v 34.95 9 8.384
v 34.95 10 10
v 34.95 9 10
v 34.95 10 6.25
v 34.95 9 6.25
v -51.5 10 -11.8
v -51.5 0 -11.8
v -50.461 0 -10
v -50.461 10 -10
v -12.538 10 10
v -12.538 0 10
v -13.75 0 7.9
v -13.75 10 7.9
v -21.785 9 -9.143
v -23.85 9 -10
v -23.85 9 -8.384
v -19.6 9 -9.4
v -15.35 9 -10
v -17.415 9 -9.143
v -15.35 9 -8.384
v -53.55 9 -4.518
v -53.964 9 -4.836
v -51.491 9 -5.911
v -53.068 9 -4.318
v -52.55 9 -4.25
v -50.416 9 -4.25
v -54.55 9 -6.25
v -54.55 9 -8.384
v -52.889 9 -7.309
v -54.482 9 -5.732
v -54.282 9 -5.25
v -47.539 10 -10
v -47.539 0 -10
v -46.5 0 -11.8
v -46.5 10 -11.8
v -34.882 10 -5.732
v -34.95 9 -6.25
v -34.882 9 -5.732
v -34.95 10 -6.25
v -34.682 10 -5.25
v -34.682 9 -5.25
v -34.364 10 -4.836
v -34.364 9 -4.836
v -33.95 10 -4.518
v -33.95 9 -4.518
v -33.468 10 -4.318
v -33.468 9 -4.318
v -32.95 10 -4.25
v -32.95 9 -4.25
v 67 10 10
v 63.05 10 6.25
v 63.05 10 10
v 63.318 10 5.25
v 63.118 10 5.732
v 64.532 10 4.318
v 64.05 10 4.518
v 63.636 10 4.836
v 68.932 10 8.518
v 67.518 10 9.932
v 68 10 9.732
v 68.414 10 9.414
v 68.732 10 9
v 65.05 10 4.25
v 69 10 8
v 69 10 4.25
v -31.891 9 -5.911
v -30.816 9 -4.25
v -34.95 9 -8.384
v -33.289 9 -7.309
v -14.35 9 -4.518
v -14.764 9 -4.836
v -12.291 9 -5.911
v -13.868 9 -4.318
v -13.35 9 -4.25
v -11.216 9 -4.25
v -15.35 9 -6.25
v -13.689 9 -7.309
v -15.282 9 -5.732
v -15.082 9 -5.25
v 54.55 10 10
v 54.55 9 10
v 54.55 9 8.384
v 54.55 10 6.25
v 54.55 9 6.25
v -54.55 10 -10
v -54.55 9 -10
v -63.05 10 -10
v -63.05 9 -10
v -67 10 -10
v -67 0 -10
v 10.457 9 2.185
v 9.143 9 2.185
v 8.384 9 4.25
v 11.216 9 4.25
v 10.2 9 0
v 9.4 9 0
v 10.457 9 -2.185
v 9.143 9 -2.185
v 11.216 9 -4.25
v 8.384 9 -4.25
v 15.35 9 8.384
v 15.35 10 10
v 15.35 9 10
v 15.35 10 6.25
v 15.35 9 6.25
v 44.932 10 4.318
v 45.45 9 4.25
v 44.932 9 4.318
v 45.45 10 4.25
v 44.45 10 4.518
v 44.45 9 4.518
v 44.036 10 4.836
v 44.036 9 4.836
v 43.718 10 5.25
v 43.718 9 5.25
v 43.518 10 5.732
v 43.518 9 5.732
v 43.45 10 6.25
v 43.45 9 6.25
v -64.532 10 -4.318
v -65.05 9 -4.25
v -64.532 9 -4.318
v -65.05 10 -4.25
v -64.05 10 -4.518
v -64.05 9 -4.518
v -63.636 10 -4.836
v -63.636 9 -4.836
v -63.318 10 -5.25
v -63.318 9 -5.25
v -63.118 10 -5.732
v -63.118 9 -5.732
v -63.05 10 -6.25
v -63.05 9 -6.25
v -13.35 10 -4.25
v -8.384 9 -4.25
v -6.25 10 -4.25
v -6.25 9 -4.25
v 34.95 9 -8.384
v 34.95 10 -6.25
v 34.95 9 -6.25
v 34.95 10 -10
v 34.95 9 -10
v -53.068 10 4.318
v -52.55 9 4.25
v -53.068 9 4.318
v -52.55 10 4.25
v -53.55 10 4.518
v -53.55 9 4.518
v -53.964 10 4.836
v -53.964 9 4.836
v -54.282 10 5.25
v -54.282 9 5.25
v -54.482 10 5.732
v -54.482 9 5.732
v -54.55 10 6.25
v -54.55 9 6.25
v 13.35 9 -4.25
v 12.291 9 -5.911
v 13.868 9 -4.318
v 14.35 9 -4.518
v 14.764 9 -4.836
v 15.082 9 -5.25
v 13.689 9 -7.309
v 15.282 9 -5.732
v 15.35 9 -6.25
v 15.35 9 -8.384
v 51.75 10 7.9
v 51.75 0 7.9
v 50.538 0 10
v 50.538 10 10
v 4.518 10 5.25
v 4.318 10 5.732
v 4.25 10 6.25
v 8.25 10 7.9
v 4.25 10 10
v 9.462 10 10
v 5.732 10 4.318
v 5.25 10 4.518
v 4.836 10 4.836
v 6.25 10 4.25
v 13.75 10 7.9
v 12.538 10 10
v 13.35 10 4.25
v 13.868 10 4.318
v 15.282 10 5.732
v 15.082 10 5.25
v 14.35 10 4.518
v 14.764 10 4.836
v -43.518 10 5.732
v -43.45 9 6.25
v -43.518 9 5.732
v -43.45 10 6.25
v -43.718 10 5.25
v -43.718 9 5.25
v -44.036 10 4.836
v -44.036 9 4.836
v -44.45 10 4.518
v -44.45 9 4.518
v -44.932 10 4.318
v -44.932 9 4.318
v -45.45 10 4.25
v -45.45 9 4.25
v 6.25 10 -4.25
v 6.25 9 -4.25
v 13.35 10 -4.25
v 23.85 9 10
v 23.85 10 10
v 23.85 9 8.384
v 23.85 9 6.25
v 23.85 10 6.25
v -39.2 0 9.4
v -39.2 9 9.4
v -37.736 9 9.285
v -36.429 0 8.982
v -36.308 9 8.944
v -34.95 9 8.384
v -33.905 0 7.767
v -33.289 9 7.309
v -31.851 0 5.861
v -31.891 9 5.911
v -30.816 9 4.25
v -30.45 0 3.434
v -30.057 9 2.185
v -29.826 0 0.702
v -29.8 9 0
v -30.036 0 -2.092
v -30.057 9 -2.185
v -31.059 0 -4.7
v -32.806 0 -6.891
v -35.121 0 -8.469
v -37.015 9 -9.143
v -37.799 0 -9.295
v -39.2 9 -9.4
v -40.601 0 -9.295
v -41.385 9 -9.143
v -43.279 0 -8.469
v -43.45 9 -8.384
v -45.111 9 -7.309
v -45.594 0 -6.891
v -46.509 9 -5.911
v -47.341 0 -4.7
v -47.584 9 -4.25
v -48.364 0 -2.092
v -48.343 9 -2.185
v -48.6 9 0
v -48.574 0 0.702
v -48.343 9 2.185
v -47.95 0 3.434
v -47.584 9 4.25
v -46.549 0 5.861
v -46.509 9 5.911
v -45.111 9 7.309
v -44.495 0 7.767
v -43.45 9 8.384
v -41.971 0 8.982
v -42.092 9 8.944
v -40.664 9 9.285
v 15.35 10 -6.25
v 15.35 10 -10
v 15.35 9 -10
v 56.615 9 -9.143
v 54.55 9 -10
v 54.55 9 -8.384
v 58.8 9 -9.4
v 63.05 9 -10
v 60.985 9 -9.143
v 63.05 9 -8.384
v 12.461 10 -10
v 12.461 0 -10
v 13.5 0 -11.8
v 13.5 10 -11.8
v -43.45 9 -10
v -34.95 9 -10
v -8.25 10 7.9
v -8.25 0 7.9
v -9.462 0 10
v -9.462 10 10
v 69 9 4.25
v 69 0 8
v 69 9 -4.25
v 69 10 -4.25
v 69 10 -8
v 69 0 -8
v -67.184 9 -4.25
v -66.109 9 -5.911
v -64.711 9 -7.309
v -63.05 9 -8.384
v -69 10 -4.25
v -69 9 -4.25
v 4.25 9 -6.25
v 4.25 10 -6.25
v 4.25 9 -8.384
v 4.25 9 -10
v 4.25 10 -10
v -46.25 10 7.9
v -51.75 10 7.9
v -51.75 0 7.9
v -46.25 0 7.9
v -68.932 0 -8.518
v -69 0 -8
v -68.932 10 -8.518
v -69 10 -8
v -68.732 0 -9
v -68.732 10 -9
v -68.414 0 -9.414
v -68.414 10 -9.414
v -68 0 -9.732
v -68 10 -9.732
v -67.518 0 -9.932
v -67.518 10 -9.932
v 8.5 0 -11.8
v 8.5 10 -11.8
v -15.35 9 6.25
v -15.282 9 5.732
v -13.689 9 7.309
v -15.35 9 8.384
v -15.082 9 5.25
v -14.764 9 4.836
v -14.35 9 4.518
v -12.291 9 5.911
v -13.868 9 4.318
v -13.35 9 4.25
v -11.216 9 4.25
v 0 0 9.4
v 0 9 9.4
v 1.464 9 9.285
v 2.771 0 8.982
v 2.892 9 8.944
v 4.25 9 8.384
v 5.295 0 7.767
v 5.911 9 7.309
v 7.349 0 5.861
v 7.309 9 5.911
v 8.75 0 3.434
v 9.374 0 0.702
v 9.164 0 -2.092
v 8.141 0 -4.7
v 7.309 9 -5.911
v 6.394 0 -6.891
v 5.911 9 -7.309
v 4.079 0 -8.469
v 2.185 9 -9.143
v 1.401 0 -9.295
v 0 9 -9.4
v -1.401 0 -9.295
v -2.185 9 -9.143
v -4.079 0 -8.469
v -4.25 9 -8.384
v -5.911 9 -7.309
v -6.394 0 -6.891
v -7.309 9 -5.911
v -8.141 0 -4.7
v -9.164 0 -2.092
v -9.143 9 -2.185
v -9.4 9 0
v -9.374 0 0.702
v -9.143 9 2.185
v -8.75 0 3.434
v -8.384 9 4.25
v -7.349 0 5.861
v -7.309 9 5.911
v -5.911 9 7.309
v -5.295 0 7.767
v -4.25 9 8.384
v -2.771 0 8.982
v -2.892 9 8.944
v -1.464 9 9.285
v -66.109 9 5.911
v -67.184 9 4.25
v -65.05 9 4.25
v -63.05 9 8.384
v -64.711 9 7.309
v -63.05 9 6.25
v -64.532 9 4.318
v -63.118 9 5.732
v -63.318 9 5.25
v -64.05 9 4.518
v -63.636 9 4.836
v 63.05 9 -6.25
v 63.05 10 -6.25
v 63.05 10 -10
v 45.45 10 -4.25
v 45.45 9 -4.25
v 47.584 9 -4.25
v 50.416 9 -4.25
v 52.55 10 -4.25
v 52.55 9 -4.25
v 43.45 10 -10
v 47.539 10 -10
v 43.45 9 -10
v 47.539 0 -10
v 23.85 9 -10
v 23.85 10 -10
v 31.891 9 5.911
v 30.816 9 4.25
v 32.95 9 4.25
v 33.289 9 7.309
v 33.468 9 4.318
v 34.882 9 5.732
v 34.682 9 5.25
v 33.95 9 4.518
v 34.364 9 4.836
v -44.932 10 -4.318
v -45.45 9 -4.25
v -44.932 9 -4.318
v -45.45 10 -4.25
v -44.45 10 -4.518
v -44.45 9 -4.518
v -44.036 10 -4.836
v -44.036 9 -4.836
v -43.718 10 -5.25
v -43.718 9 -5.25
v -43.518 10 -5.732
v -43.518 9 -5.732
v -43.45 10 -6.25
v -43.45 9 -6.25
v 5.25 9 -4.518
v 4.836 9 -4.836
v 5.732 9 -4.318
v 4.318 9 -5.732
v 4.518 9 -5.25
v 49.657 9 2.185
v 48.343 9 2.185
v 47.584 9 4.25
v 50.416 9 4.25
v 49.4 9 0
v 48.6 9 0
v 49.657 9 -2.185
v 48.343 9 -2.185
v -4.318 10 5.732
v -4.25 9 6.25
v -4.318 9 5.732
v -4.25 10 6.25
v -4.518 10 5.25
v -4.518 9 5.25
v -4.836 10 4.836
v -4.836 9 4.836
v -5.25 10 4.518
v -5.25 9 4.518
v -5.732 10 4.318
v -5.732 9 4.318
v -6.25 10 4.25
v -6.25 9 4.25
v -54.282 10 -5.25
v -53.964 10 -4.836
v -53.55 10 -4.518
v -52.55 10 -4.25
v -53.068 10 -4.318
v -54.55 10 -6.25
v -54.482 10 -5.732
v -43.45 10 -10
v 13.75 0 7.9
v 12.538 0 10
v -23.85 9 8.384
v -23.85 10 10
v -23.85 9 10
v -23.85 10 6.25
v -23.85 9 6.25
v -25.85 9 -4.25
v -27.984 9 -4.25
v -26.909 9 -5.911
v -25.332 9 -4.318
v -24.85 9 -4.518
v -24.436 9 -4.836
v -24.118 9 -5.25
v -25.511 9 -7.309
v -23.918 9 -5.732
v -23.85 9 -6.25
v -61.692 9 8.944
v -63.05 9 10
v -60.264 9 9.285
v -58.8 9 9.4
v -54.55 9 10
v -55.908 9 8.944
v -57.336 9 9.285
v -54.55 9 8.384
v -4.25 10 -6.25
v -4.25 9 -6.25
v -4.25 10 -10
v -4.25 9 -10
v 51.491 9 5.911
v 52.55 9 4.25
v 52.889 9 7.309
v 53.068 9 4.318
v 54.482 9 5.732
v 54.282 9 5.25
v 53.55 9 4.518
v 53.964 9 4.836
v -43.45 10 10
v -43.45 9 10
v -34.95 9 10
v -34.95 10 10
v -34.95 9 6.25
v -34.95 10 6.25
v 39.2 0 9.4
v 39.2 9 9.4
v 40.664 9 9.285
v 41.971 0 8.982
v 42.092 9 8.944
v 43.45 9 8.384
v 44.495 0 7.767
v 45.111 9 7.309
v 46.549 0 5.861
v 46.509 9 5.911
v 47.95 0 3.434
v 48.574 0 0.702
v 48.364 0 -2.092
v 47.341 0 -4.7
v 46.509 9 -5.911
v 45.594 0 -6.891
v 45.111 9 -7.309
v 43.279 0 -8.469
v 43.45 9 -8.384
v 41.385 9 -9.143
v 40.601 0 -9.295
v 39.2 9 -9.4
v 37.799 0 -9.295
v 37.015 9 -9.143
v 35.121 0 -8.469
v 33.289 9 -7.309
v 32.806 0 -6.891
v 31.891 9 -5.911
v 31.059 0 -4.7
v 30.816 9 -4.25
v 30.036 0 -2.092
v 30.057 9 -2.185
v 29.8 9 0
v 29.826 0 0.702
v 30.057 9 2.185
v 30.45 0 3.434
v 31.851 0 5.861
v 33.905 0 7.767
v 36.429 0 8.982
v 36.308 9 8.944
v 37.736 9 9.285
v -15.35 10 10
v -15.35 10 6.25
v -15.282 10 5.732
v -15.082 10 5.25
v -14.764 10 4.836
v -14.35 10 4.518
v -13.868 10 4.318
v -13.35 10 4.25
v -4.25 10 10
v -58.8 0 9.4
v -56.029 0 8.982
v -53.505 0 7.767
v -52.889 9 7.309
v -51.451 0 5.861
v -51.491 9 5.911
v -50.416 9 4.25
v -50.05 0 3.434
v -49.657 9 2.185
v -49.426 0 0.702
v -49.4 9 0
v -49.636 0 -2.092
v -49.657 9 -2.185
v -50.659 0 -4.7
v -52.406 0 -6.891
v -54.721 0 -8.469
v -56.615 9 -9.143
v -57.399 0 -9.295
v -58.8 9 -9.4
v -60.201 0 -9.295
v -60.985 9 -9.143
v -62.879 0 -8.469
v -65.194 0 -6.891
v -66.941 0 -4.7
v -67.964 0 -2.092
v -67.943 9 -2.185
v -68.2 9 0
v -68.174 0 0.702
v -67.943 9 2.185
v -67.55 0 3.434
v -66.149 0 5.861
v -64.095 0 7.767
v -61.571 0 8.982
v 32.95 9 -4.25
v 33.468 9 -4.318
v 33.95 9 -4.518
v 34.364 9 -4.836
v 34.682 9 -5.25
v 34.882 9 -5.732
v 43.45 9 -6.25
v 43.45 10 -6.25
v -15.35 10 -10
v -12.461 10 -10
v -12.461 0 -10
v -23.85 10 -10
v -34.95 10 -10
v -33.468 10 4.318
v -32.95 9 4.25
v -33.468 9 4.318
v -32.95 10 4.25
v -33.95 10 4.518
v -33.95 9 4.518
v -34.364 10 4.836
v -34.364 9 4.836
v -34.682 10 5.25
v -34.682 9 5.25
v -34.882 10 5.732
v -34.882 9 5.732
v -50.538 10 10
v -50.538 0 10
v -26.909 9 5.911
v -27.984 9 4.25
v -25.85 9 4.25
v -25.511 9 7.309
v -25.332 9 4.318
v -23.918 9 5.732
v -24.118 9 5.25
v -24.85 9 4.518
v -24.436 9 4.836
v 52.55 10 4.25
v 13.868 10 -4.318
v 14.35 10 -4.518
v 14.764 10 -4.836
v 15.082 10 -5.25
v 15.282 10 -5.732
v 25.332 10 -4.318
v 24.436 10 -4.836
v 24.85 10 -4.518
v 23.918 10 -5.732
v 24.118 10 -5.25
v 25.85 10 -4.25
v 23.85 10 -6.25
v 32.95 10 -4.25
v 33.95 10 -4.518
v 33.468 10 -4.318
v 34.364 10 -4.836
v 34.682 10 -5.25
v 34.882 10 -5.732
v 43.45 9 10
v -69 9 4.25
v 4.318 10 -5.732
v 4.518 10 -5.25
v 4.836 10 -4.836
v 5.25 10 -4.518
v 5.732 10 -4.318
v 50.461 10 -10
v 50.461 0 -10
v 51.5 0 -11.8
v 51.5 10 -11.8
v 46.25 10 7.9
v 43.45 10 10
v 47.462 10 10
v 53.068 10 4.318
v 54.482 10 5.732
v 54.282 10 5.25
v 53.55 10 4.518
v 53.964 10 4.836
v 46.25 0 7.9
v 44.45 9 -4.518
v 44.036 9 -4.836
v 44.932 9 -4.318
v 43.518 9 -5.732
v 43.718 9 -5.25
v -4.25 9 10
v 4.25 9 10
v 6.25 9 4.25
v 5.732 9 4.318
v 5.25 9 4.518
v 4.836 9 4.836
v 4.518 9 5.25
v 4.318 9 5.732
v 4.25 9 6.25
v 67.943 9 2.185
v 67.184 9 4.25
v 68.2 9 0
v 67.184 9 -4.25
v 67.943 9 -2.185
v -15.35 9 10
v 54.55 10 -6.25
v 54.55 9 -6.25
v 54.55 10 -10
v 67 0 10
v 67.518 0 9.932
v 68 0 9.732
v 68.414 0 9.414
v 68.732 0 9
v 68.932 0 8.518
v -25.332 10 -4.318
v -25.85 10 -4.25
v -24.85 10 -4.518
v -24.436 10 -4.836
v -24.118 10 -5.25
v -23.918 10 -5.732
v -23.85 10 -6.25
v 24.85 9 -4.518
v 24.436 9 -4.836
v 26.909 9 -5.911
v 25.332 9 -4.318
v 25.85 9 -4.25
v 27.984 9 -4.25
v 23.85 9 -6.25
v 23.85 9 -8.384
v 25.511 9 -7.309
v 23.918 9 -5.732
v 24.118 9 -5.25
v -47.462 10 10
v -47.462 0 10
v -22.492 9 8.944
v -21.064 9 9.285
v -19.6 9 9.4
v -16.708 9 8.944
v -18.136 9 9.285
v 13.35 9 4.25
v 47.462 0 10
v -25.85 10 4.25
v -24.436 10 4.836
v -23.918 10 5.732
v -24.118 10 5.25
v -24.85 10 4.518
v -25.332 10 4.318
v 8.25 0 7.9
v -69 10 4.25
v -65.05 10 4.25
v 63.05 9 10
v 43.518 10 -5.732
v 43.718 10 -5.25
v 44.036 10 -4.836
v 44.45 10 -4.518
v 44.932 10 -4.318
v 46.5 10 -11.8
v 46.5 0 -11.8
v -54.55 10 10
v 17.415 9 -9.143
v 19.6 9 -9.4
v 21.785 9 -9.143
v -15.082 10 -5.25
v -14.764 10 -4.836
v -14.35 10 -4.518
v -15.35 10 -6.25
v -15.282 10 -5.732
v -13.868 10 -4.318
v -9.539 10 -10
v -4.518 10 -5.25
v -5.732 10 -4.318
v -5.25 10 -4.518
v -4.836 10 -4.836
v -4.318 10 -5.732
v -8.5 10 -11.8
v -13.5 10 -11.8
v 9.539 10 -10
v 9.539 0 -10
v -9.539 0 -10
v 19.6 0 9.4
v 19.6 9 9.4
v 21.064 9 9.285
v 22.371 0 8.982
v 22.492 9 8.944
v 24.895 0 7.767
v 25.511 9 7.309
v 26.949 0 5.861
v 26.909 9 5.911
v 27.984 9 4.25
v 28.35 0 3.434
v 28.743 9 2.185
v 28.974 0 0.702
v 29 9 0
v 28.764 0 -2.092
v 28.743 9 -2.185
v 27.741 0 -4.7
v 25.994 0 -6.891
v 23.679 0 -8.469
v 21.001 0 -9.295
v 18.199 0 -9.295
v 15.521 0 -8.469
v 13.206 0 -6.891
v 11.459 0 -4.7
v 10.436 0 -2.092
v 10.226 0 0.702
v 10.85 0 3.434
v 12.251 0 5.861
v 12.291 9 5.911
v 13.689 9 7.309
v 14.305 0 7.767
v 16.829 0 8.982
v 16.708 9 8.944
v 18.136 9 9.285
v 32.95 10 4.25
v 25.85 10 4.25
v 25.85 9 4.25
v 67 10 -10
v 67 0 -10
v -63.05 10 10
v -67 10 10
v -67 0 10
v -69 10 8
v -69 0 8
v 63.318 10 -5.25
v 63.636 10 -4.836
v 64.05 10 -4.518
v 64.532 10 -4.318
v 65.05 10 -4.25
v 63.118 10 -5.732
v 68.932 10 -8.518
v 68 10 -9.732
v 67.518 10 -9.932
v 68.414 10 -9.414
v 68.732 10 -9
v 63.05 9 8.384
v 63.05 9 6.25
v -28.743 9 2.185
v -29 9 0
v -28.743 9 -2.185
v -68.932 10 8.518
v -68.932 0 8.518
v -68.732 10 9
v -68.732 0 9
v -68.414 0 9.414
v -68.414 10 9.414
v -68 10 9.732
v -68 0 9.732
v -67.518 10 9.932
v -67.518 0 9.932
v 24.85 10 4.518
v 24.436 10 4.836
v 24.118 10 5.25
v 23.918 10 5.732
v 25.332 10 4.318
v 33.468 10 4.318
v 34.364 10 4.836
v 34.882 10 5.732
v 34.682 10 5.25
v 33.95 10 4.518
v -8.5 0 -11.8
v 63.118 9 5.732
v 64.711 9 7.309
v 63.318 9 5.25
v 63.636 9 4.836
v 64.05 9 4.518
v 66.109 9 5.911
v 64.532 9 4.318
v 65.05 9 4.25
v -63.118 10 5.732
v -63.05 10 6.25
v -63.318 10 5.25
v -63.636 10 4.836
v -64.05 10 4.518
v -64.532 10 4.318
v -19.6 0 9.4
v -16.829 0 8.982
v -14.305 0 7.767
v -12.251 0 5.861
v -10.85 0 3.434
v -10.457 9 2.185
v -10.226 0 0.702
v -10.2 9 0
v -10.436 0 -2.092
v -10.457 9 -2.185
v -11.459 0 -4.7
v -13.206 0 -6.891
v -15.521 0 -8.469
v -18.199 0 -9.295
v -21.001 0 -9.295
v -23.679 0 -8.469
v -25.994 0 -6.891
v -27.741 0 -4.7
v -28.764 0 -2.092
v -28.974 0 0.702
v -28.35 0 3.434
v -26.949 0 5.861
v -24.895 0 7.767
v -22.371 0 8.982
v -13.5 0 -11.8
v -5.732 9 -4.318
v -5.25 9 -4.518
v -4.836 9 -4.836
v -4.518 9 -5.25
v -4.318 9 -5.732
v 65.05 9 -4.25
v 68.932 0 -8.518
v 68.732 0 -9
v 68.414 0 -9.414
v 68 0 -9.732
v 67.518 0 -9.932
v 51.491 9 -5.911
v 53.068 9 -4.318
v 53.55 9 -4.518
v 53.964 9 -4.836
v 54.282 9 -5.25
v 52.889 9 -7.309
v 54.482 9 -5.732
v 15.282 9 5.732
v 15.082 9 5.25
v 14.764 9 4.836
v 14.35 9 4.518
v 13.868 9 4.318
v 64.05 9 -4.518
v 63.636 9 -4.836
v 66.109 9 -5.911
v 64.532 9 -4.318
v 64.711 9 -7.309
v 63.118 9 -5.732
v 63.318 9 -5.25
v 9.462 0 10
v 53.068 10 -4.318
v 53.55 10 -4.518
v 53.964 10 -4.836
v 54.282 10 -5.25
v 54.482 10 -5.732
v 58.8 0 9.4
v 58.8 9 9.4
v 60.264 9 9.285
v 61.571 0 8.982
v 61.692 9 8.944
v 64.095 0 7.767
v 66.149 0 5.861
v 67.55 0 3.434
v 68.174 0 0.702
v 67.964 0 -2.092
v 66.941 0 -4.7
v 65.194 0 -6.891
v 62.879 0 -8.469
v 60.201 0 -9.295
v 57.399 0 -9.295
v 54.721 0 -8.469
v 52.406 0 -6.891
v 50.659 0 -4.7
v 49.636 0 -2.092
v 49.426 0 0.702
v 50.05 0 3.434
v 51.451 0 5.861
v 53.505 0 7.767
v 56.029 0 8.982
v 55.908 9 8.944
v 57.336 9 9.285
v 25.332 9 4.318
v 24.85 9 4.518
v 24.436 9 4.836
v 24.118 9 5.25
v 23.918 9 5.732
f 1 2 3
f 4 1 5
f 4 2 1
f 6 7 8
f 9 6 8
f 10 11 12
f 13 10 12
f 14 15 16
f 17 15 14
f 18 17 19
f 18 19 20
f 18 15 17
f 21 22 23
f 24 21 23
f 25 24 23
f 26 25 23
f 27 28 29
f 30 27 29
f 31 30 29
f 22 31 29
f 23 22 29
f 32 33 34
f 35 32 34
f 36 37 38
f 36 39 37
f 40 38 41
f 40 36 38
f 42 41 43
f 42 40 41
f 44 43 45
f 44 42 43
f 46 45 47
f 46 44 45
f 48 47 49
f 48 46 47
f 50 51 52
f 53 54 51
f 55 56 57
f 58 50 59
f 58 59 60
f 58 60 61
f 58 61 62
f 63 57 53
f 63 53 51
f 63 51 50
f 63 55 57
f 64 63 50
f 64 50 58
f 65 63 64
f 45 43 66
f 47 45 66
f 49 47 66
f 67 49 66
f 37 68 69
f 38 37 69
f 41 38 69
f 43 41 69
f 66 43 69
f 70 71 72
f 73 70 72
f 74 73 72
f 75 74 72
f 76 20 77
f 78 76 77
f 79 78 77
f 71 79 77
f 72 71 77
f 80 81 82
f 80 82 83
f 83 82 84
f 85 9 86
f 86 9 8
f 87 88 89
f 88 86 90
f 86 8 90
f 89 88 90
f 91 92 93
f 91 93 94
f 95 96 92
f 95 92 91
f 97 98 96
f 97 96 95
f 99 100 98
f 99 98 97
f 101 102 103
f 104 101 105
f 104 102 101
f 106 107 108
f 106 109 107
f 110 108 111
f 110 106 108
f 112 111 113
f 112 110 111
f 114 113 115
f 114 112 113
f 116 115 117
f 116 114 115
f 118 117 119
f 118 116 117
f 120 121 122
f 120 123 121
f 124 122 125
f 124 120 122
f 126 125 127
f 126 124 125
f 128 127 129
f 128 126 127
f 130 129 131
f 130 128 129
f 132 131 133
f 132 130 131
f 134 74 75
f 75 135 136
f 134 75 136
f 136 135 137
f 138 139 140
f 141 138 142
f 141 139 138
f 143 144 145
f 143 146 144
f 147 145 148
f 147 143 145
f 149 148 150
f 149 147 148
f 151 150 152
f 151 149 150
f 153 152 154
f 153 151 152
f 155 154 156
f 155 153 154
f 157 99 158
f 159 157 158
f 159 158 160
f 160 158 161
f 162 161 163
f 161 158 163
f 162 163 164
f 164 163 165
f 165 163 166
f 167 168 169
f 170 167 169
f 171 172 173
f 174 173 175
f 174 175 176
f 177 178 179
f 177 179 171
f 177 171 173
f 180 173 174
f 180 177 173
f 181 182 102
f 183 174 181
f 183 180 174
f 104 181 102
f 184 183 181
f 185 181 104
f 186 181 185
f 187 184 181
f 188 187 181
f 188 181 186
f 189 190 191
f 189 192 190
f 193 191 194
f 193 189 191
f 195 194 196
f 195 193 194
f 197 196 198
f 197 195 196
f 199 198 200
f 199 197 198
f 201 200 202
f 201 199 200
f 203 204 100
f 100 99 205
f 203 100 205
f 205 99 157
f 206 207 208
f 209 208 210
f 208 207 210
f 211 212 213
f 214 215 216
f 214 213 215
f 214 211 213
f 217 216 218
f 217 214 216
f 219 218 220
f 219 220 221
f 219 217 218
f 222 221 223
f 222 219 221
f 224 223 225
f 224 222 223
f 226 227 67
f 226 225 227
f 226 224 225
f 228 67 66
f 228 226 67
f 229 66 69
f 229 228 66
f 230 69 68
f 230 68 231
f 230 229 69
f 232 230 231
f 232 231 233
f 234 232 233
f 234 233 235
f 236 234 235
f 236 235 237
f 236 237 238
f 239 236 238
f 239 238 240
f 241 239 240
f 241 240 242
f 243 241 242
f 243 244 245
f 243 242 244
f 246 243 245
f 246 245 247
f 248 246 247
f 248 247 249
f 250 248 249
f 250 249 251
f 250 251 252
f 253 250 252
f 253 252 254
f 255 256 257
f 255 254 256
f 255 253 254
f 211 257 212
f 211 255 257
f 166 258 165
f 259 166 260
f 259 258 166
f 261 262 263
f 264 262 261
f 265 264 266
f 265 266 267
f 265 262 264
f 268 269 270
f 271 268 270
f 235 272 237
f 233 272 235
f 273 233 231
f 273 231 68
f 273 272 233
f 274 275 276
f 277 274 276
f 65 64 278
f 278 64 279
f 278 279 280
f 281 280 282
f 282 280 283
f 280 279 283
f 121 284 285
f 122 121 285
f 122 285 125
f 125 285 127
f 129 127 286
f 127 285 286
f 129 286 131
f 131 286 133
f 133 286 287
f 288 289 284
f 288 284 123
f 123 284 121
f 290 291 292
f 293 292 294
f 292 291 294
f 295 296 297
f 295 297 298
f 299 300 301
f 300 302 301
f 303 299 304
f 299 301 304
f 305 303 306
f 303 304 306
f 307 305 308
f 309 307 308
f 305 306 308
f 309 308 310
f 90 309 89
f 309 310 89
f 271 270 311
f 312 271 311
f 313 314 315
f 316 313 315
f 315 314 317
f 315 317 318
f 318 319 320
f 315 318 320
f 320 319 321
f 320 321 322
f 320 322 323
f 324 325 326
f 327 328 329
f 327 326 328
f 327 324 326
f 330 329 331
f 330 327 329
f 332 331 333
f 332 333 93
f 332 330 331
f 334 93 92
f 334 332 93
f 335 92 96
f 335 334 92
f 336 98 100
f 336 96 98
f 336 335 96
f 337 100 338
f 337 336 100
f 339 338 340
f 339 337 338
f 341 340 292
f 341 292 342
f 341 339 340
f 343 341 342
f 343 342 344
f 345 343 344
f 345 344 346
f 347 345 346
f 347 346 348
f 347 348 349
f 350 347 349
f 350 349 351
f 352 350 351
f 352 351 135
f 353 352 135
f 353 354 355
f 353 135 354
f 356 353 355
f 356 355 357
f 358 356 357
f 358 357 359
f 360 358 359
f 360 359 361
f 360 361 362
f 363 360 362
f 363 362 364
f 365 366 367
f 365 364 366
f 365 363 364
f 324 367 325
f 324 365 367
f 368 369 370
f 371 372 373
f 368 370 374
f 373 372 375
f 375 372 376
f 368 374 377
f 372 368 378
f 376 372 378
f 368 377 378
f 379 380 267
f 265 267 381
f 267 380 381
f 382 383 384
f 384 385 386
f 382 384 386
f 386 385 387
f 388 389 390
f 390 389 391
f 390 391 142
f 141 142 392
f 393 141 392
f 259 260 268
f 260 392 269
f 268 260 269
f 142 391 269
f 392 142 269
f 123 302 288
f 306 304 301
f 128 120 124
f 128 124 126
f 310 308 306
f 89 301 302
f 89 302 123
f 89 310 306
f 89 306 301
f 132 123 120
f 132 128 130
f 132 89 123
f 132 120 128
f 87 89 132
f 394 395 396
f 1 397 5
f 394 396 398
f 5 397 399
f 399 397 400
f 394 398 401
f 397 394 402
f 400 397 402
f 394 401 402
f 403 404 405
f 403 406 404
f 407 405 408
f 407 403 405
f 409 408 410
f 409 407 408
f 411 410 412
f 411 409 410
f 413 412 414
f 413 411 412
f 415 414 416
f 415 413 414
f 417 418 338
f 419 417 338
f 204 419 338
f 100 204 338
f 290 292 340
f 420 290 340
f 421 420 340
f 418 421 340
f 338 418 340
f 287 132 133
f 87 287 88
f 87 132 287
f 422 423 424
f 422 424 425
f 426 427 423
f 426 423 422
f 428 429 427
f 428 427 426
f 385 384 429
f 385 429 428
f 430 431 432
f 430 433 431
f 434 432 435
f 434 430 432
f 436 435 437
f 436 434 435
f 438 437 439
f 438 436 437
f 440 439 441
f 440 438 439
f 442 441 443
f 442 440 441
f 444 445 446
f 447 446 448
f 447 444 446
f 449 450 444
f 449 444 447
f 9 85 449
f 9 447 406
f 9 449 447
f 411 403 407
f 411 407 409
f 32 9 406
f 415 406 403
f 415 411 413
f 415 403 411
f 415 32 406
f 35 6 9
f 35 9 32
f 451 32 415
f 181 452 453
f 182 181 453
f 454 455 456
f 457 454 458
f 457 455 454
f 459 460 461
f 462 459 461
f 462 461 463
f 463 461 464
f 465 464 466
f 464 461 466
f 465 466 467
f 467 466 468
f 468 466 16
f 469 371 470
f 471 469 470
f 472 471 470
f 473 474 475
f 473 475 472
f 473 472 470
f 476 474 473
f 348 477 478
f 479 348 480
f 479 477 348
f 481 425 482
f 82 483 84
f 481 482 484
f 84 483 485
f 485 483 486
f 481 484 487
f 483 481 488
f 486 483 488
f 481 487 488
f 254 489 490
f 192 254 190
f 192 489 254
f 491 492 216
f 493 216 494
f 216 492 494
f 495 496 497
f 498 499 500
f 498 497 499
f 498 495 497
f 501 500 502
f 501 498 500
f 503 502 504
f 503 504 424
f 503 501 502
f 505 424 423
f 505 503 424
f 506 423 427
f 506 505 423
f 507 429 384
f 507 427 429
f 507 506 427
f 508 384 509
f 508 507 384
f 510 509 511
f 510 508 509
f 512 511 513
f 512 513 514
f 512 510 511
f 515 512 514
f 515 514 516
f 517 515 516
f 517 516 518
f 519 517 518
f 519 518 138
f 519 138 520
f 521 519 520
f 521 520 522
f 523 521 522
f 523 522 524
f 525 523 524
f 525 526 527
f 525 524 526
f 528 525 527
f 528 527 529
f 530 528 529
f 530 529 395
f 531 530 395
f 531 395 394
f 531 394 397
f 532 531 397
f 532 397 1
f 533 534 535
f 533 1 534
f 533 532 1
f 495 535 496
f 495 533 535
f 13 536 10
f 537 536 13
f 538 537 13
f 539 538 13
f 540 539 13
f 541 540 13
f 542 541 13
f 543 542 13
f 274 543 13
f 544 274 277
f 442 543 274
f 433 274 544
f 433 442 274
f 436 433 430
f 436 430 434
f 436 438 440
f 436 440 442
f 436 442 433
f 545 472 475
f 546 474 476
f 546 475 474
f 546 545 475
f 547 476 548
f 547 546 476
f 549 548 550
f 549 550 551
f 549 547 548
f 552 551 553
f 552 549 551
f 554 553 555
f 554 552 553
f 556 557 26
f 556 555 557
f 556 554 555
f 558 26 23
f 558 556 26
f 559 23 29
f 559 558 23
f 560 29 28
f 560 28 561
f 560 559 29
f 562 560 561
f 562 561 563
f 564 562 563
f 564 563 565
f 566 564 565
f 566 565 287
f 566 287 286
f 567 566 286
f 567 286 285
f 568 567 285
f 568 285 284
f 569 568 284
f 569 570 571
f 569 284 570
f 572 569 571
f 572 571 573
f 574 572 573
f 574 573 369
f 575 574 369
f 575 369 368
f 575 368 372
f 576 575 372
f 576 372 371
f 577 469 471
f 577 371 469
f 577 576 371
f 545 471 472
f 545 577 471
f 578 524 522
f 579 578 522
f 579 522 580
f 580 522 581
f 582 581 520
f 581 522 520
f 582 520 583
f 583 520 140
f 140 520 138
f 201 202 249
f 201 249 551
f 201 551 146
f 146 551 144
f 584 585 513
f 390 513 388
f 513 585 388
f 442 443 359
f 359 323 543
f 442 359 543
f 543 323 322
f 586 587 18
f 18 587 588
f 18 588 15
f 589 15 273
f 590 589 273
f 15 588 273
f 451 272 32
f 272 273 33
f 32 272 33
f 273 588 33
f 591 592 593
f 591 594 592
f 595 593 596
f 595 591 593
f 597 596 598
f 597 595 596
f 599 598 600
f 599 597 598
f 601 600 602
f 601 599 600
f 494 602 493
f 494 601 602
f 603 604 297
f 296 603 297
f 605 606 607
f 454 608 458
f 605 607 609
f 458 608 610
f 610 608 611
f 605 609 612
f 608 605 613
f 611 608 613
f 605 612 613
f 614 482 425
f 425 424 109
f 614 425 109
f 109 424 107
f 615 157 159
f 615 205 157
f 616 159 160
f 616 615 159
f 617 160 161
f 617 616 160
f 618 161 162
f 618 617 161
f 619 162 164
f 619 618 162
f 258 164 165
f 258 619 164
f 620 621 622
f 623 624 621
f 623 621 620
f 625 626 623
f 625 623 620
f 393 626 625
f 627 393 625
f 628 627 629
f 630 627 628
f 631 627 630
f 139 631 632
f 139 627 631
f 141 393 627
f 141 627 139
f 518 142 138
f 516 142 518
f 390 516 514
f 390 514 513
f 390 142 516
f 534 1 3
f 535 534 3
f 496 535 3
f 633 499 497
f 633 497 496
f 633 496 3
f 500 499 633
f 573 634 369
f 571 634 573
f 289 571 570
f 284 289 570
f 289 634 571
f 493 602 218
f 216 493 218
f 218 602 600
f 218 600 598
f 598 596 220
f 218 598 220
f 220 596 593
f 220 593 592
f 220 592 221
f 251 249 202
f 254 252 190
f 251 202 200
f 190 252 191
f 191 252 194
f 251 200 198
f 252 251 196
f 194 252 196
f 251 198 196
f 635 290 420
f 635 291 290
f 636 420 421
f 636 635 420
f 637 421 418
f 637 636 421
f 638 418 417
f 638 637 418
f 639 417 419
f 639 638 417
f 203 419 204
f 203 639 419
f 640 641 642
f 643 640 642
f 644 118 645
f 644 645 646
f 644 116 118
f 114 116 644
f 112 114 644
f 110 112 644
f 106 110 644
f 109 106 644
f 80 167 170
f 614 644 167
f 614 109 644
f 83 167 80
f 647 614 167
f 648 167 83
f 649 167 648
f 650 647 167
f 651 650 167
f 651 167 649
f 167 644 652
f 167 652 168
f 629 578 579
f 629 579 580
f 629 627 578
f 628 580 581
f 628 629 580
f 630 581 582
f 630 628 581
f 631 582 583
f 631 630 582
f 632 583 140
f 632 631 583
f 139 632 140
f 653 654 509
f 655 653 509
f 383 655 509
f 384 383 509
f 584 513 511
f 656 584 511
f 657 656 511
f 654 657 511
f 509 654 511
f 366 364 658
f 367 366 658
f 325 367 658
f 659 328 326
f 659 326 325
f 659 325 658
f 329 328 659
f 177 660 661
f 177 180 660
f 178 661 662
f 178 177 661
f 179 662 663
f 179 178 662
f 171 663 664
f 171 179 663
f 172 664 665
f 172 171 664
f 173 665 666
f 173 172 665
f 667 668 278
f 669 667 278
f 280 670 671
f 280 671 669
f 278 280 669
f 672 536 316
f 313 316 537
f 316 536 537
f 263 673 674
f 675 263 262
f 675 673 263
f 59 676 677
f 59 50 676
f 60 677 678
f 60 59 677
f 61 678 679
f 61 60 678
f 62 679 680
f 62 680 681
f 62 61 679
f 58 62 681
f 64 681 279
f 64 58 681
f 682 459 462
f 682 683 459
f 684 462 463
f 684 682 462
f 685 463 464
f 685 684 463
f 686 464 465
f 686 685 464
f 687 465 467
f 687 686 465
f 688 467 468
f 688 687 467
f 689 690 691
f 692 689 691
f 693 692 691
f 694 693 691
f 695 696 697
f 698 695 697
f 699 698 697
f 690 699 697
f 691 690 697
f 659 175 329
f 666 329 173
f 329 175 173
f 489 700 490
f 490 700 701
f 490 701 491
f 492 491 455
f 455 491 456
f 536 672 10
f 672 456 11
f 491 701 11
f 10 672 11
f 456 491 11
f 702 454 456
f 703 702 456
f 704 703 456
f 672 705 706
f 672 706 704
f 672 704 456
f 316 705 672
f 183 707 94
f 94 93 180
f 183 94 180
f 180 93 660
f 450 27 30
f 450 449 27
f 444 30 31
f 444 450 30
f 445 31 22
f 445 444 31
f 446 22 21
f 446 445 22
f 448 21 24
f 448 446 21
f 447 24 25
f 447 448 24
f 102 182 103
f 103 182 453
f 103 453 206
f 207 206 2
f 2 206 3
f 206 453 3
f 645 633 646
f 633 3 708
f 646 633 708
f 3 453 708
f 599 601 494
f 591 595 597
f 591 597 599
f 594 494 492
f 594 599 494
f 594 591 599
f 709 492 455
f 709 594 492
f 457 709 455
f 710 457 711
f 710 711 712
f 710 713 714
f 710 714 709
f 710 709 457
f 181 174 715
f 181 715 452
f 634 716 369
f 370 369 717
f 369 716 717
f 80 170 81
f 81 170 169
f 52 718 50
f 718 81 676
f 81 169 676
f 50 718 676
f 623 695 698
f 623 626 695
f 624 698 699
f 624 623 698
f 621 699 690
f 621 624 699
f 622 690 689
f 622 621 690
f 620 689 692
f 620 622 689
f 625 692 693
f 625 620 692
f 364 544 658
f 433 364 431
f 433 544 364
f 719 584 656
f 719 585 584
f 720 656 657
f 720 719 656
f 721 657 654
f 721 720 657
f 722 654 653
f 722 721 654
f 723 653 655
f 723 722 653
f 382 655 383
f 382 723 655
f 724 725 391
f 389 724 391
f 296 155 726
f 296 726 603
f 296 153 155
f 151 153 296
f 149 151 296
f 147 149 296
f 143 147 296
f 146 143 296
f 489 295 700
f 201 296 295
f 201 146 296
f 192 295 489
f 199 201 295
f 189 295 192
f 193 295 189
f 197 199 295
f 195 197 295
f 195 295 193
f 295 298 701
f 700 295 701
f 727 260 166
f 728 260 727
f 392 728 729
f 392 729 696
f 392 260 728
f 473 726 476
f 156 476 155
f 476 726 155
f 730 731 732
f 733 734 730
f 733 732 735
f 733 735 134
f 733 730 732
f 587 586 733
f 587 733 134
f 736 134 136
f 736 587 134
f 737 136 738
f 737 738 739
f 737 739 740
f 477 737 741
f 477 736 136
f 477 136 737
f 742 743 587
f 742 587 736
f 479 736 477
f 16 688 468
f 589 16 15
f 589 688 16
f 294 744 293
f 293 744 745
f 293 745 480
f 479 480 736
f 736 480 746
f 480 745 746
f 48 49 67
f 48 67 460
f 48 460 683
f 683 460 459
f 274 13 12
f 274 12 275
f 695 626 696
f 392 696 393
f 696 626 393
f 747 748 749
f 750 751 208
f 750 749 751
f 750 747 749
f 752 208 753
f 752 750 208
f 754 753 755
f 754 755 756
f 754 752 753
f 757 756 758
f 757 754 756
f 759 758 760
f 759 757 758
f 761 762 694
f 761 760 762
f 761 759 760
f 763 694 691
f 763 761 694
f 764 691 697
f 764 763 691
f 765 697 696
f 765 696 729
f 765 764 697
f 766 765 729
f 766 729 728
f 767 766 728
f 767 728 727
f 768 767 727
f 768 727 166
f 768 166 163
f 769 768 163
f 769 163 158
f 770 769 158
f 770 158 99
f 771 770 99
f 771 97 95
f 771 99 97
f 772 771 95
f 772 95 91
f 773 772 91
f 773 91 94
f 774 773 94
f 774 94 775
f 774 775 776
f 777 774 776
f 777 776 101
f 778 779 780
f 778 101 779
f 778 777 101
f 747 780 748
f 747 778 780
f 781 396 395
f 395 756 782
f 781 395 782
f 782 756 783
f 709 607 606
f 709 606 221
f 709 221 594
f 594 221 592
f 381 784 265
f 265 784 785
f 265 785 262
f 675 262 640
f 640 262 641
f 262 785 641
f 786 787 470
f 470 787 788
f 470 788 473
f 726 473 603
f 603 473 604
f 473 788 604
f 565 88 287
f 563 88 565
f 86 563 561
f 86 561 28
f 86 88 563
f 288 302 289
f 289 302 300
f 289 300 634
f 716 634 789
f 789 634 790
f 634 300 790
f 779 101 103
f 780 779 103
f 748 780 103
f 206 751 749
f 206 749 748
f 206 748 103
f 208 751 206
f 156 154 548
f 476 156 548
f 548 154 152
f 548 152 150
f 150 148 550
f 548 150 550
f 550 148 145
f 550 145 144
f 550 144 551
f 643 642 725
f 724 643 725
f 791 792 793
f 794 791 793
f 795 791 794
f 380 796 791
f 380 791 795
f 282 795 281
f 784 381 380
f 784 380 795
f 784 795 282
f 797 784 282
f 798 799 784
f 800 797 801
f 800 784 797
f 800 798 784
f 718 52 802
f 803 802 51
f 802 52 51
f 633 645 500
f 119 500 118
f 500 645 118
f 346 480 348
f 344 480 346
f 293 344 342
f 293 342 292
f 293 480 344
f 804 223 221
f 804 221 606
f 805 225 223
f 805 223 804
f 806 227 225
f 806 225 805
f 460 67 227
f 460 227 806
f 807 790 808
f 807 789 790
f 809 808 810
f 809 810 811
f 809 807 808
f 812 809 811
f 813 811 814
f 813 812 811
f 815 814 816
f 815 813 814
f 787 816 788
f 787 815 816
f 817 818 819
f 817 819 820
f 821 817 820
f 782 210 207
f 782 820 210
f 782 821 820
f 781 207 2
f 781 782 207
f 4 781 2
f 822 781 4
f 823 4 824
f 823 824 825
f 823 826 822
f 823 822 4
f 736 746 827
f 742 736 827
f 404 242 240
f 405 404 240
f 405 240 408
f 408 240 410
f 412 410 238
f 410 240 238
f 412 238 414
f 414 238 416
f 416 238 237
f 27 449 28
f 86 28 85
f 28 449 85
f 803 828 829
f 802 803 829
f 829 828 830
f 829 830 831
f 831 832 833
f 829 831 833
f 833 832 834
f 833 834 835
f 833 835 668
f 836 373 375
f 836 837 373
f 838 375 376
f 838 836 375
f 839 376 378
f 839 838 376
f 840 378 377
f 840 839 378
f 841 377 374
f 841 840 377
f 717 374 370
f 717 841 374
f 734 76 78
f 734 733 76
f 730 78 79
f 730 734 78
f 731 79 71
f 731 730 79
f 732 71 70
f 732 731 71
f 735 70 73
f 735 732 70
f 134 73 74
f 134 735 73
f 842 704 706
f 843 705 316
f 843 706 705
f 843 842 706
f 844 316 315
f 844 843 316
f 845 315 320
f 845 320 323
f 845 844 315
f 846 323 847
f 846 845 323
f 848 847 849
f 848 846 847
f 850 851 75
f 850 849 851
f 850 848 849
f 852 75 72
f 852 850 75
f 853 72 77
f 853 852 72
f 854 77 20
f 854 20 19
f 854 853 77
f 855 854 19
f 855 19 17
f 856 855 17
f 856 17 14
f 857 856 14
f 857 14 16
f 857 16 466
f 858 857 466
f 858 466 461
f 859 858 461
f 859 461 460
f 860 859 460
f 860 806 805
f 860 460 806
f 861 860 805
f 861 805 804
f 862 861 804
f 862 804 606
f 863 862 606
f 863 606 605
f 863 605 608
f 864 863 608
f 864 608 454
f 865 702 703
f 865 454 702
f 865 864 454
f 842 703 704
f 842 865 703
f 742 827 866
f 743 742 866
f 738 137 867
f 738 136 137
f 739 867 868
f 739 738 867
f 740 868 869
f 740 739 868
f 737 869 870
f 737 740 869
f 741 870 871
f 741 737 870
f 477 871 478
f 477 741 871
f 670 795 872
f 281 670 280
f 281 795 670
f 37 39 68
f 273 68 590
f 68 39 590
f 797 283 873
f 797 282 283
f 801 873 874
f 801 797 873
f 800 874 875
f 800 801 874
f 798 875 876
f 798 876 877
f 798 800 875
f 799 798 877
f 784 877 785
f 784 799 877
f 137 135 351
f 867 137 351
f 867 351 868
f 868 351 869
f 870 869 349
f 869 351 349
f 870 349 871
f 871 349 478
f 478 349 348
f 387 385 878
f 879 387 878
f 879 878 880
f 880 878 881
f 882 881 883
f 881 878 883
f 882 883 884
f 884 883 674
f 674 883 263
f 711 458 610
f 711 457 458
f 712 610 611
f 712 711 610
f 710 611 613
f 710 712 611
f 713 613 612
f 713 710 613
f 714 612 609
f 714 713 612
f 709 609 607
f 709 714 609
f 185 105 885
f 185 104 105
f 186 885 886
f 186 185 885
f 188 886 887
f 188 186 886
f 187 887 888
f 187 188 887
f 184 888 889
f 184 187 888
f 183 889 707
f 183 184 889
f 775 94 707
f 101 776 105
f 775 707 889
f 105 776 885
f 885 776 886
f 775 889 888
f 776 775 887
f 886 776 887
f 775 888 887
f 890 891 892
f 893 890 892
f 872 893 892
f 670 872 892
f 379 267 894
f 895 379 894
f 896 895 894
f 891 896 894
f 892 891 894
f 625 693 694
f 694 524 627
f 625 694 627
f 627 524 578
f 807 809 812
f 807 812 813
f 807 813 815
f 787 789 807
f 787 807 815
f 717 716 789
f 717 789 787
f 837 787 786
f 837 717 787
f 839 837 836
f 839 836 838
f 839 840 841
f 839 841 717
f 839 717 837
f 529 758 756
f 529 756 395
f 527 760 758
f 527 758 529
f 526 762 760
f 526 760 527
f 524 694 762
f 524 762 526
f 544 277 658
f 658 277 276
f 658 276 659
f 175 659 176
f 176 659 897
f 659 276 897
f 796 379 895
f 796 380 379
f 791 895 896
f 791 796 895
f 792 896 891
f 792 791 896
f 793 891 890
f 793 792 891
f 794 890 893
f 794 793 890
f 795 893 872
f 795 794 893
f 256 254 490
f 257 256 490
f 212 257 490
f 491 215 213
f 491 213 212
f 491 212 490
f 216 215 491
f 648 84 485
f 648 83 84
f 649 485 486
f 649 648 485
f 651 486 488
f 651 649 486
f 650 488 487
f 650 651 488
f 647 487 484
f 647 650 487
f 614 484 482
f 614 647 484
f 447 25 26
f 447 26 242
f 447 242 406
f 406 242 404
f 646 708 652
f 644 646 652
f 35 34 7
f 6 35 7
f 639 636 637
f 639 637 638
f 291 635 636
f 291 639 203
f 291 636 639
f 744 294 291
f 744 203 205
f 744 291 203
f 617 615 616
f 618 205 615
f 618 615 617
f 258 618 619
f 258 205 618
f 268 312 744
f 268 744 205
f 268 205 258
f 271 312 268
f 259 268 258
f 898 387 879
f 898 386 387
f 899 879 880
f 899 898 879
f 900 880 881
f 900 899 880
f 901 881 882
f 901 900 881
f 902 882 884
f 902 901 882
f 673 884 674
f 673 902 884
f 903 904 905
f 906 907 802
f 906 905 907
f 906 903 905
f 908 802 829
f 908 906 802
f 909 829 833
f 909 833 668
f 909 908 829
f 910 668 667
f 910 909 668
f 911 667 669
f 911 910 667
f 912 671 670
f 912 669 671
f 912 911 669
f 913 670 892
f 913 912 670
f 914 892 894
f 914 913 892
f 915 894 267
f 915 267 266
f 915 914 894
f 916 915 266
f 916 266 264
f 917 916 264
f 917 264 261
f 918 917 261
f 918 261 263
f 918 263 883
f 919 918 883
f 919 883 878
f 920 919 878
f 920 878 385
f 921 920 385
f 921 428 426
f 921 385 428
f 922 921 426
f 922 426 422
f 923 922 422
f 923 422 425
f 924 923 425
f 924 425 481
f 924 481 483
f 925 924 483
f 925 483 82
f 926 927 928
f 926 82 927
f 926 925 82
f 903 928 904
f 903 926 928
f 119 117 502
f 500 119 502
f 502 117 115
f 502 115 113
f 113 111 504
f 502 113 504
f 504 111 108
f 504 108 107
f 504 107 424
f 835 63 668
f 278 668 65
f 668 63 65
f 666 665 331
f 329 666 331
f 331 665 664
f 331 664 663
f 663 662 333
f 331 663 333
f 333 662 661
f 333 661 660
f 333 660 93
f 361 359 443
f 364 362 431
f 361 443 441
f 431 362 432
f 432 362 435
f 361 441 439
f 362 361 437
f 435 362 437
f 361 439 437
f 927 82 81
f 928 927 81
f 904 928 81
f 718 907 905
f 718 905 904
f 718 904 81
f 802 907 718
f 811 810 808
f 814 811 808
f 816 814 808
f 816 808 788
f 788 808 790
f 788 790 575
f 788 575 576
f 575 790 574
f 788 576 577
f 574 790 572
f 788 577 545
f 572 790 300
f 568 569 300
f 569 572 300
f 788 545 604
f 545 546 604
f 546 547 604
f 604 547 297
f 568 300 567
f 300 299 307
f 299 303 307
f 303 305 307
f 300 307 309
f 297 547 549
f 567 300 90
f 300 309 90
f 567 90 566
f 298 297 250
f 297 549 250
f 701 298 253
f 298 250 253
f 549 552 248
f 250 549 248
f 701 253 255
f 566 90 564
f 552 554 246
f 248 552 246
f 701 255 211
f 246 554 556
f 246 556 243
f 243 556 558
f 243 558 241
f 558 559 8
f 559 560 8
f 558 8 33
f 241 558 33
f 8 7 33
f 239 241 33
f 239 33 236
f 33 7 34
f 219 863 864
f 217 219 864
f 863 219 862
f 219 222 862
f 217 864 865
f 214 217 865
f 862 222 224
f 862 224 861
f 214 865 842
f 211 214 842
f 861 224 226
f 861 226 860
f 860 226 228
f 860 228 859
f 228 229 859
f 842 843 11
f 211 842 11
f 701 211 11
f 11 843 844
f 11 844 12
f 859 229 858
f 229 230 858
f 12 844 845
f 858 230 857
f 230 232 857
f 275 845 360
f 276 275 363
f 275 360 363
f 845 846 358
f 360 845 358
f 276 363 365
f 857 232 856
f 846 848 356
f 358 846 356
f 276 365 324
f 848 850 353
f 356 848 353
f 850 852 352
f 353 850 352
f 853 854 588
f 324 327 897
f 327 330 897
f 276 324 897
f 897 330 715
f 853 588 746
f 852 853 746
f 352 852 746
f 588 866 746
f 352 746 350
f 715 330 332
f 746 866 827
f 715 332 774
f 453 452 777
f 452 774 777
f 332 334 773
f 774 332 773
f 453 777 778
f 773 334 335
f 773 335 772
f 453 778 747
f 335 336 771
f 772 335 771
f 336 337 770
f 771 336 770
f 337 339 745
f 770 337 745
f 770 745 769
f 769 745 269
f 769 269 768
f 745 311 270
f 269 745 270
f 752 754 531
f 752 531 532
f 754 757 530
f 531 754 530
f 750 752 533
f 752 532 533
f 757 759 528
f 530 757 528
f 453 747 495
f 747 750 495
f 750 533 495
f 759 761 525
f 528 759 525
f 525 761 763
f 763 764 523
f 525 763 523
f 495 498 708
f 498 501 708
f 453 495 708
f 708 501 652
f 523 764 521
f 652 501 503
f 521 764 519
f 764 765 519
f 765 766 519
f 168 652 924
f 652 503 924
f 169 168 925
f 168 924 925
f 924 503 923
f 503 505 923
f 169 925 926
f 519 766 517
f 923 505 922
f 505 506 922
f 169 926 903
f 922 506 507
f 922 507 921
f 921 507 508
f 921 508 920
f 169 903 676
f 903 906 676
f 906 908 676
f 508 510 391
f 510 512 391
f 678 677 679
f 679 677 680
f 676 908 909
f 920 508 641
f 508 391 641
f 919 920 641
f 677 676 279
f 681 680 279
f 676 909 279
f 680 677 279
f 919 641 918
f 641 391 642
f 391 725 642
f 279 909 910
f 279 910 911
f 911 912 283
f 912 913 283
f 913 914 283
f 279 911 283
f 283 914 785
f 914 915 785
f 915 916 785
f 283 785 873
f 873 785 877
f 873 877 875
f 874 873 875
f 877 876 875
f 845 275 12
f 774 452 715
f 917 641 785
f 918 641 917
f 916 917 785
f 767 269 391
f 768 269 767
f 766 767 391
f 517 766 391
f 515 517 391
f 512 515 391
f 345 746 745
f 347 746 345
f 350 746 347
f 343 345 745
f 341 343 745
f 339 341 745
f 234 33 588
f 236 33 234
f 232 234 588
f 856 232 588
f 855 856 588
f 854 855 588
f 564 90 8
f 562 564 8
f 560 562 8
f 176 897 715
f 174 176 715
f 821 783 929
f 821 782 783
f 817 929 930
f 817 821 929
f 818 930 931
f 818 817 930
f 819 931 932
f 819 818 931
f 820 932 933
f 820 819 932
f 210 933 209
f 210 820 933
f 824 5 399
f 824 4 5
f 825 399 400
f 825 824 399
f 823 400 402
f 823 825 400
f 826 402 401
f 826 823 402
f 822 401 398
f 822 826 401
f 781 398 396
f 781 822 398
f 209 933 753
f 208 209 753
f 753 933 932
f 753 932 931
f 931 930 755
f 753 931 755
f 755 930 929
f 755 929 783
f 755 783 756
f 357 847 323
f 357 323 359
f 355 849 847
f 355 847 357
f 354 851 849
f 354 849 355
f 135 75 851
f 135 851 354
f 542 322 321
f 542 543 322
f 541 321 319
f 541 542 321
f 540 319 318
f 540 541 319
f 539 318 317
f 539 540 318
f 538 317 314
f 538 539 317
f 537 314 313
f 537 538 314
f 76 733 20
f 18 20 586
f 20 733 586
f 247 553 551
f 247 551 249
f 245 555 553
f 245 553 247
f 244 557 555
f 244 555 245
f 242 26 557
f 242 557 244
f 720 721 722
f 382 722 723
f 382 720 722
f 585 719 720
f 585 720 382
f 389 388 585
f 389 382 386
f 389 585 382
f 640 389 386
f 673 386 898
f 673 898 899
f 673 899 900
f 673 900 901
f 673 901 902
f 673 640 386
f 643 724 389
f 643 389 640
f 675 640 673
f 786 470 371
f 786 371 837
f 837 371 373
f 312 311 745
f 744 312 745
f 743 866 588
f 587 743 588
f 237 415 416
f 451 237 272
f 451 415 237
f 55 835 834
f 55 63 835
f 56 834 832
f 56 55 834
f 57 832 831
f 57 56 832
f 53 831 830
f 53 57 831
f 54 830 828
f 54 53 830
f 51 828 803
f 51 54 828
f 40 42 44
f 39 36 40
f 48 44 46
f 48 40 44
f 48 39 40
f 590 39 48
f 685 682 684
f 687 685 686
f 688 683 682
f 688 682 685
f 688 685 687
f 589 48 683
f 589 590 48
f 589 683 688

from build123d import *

# Parameters (mm, degrees)
SKETCH3_R              = 9.4
SKETCH3_R_2            = 9.400000000000007
SKETCH3_R_3            = 9.400000000000002
BOSS_EXTRUDE1_DEPTH    = 10
BOSS_EXTRUDE2_START    = -1
BOSS_EXTRUDE2_DEPTH    = 1
FILLET2_R              = 2
LPATTERN1_COUNT        = 7
LPATTERN1_PITCH        = 19.6
FILLET2_OF_LPATTERN1_R = 2
FILLET3_R              = 2
SKETCH4_5_W            = 137.99999999999994
SKETCH4_5_H            = 8.5
CUT_EXTRUDE2_DEPTH     = 1
SKETCH4_6_W            = 8.500000000000007
SKETCH4_6_H            = 19.999999999999993
CUT_EXTRUDE3_DEPTH     = 1
LPATTERN2_COUNT        = 7
LPATTERN2_PITCH        = 19.6


with BuildPart() as part:
    # Sketch3 → Boss-Extrude1 (new body)
    with BuildSketch(Plane(origin=(0, 0, 0), x_dir=(1, 0, 0), z_dir=(0, 1, 0))):
        Polygon((-69.00000000000003, 10.000000000000002), (-69.00000000000003, -10.000000000000002), (-50.53756443470182, -10.000000000000002), (-51.750000000000036, -7.899999999999998), (-46.25000000000003, -7.899999999999998), (-47.462435565298236, -9.999999999999998), (-12.537564434701821, -10.000000000000002), (-13.750000000000034, -7.899999999999998), (-8.250000000000028, -7.899999999999998), (-9.462435565298238, -9.999999999999998), (9.462435565298179, -10.000000000000002), (8.249999999999977, -7.899999999999998), (13.74999999999998, -7.899999999999998), (12.537564434701773, -9.999999999999998), (47.46243556529818, -10.000000000000002), (46.24999999999997, -7.899999999999998), (51.74999999999998, -7.899999999999998), (50.53756443470177, -9.999999999999998), (68.99999999999997, -10.000000000000002), (68.99999999999997, 9.999999999999998), (50.46076951545864, 9.999999999999998), (51.49999999999998, 11.8), (46.49999999999997, 11.8), (47.539230484541314, 10.000000000000002), (12.460769515458637, 10), (13.49999999999998, 11.8), (8.499999999999977, 11.8), (9.539230484541315, 10.000000000000002), (-9.53923048454137, 10), (-8.500000000000028, 11.8), (-13.500000000000032, 11.8), (-12.460769515458693, 10.000000000000002), (-47.53923048454137, 10.000000000000002), (-46.50000000000003, 11.8), (-51.50000000000003, 11.8), (-50.46076951545869, 10.000000000000002), align=None)
        with Locations((-58.80000000000003, -8.1599e-13)):
            Circle(SKETCH3_R, mode=Mode.SUBTRACT)
        with Locations((-39.20000000000004, -6.7913e-13)):
            Circle(SKETCH3_R, mode=Mode.SUBTRACT)
        with Locations((-19.600000000000033, -5.4226e-13)):
            Circle(SKETCH3_R, mode=Mode.SUBTRACT)
        Circle(SKETCH3_R, mode=Mode.SUBTRACT)
        with Locations((19.599999999999973, -2.6853e-13)):
            Circle(SKETCH3_R, mode=Mode.SUBTRACT)
        with Locations((39.199999999999974, -1.3166e-13)):
            Circle(SKETCH3_R_2, mode=Mode.SUBTRACT)
        with Locations((58.799999999999976, 5.2e-15)):
            Circle(SKETCH3_R_3, mode=Mode.SUBTRACT)
    extrude(amount=BOSS_EXTRUDE1_DEPTH)

    # Sketch4 → Boss-Extrude2 (add)
    with BuildSketch(Plane(origin=(0, 10, 0), x_dir=(1, 0, 0), z_dir=(0, 1, 0)).offset(BOSS_EXTRUDE2_START)):
        with BuildLine():
            Line((54.549999999999976, 4.25), (54.549999999999976, 8.384360440725105))
            ThreePointArc((54.549999999999685, 8.384360440725203), (52.1531962568464, 6.646803743153534), (50.41563955927475, 4.2500000000002425))
            Line((50.41563955927484, 4.25), (54.54999999999998, 4.25))
        make_face()
        with BuildLine():
            ThreePointArc((67.18436044072524, 4.250000000000159), (65.44680374315354, 6.646803743153543), (63.05000000000016, 8.384360440725256))
            Line((63.04999999999998, 8.38436044072519), (63.04999999999998, 4.25))
            Line((63.04999999999998, 4.25), (67.18436044072519, 4.25))
        make_face()
        with BuildLine():
            Line((54.54999999999998, -4.25), (50.41563955927484, -4.25))
            ThreePointArc((50.41563955927475, -4.250000000000238), (52.15319625684641, -6.646803743153529), (54.54999999999969, -8.384360440725196))
            Line((54.549999999999976, -8.384360440725096), (54.549999999999976, -4.25))
        make_face()
        with BuildLine():
            Line((67.18436044072519, -4.25), (63.04999999999998, -4.25))
            Line((63.04999999999998, -4.25), (63.04999999999998, -8.384360440725185))
            ThreePointArc((63.05000000000015, -8.384360440725251), (65.44680374315354, -6.646803743153541), (67.18436044072524, -4.250000000000151))
        make_face()
    boss_extrude2 = extrude(amount=BOSS_EXTRUDE2_DEPTH)

    # Fillet2
    fillet2_edges = [part.edges().sort_by_distance(p)[0] for p in [
        (54.54999999999998, 9.5, -4.25),
        (54.54999999999998, 9.5, 4.25),
        (63.04999999999998, 9.5, 4.25),
        (63.04999999999998, 9.5, -4.25),
    ]]
    fillet(fillet2_edges, radius=FILLET2_R)

    # LPattern1: Boss-Extrude2 ×7
    with Locations(*[(-i * LPATTERN1_PITCH, 0, 0) for i in range(1, LPATTERN1_COUNT)]):
        add(boss_extrude2)

    # Fillet2 of LPattern1
    fillet2_of_lpattern1_edges = [part.edges().sort_by_distance(p)[0] for p in [
        (34.94999999999998, 9.5, -4.25),
        (34.94999999999998, 9.5, 4.25),
        (43.44999999999998, 9.5, 4.25),
        (43.44999999999998, 9.5, -4.25),
        (15.34999999999998, 9.5, -4.25),
        (15.34999999999998, 9.5, 4.25),
        (23.84999999999998, 9.5, 4.25),
        (23.84999999999998, 9.5, -4.25),
        (-4.250000000000021, 9.5, -4.25),
        (-4.250000000000021, 9.5, 4.25),
        (4.249999999999979, 9.5, 4.25),
        (4.249999999999979, 9.5, -4.25),
        (-23.850000000000023, 9.5, -4.25),
        (-23.850000000000023, 9.5, 4.25),
        (-15.350000000000023, 9.5, 4.25),
        (-15.350000000000023, 9.5, -4.25),
        (-43.45000000000002, 9.5, -4.25),
        (-43.45000000000002, 9.5, 4.25),
        (-34.95000000000002, 9.5, 4.25),
        (-34.95000000000002, 9.5, -4.25),
        (-63.050000000000026, 9.5, -4.25),
        (-63.050000000000026, 9.5, 4.25),
        (-54.550000000000026, 9.5, 4.25),
        (-54.550000000000026, 9.5, -4.25),
    ]]
    fillet(fillet2_of_lpattern1_edges, radius=FILLET2_OF_LPATTERN1_R)

    # Fillet3
    fillet3_edges = [part.edges().sort_by_distance(p)[0] for p in [
        (68.99999999999997, 5, 10.000000000000002),
        (68.99999999999997, 5, -9.999999999999998),
        (-69.00000000000003, 5, 10.000000000000002),
        (-69.00000000000003, 5, -10.000000000000002),
    ]]
    fillet(fillet3_edges, radius=FILLET3_R)

    # Sketch4<5> → Cut-Extrude2 (cut)
    with BuildSketch(Plane(origin=(0, 10, 0), x_dir=(1, 0, 0), z_dir=(0, 1, 0))):
        Rectangle(SKETCH4_5_W, SKETCH4_5_H)
    extrude(amount=-CUT_EXTRUDE2_DEPTH, mode=Mode.SUBTRACT)

    # Sketch4<6> → Cut-Extrude3 (cut)
    with BuildSketch(Plane(origin=(0, 10, 0), x_dir=(1, 0, 0), z_dir=(0, 1, 0))):
        with Locations((58.79999999999998, 5.33e-15)):
            Rectangle(SKETCH4_6_W, SKETCH4_6_H)
    cut_extrude3 = extrude(amount=-CUT_EXTRUDE3_DEPTH, mode=Mode.SUBTRACT)

    # LPattern2: Cut-Extrude3 ×7
    with Locations(*[(-i * LPATTERN2_PITCH, 0, 0) for i in range(1, LPATTERN2_COUNT)]):
        add(cut_extrude3, mode=Mode.SUBTRACT)


solid = part.part
